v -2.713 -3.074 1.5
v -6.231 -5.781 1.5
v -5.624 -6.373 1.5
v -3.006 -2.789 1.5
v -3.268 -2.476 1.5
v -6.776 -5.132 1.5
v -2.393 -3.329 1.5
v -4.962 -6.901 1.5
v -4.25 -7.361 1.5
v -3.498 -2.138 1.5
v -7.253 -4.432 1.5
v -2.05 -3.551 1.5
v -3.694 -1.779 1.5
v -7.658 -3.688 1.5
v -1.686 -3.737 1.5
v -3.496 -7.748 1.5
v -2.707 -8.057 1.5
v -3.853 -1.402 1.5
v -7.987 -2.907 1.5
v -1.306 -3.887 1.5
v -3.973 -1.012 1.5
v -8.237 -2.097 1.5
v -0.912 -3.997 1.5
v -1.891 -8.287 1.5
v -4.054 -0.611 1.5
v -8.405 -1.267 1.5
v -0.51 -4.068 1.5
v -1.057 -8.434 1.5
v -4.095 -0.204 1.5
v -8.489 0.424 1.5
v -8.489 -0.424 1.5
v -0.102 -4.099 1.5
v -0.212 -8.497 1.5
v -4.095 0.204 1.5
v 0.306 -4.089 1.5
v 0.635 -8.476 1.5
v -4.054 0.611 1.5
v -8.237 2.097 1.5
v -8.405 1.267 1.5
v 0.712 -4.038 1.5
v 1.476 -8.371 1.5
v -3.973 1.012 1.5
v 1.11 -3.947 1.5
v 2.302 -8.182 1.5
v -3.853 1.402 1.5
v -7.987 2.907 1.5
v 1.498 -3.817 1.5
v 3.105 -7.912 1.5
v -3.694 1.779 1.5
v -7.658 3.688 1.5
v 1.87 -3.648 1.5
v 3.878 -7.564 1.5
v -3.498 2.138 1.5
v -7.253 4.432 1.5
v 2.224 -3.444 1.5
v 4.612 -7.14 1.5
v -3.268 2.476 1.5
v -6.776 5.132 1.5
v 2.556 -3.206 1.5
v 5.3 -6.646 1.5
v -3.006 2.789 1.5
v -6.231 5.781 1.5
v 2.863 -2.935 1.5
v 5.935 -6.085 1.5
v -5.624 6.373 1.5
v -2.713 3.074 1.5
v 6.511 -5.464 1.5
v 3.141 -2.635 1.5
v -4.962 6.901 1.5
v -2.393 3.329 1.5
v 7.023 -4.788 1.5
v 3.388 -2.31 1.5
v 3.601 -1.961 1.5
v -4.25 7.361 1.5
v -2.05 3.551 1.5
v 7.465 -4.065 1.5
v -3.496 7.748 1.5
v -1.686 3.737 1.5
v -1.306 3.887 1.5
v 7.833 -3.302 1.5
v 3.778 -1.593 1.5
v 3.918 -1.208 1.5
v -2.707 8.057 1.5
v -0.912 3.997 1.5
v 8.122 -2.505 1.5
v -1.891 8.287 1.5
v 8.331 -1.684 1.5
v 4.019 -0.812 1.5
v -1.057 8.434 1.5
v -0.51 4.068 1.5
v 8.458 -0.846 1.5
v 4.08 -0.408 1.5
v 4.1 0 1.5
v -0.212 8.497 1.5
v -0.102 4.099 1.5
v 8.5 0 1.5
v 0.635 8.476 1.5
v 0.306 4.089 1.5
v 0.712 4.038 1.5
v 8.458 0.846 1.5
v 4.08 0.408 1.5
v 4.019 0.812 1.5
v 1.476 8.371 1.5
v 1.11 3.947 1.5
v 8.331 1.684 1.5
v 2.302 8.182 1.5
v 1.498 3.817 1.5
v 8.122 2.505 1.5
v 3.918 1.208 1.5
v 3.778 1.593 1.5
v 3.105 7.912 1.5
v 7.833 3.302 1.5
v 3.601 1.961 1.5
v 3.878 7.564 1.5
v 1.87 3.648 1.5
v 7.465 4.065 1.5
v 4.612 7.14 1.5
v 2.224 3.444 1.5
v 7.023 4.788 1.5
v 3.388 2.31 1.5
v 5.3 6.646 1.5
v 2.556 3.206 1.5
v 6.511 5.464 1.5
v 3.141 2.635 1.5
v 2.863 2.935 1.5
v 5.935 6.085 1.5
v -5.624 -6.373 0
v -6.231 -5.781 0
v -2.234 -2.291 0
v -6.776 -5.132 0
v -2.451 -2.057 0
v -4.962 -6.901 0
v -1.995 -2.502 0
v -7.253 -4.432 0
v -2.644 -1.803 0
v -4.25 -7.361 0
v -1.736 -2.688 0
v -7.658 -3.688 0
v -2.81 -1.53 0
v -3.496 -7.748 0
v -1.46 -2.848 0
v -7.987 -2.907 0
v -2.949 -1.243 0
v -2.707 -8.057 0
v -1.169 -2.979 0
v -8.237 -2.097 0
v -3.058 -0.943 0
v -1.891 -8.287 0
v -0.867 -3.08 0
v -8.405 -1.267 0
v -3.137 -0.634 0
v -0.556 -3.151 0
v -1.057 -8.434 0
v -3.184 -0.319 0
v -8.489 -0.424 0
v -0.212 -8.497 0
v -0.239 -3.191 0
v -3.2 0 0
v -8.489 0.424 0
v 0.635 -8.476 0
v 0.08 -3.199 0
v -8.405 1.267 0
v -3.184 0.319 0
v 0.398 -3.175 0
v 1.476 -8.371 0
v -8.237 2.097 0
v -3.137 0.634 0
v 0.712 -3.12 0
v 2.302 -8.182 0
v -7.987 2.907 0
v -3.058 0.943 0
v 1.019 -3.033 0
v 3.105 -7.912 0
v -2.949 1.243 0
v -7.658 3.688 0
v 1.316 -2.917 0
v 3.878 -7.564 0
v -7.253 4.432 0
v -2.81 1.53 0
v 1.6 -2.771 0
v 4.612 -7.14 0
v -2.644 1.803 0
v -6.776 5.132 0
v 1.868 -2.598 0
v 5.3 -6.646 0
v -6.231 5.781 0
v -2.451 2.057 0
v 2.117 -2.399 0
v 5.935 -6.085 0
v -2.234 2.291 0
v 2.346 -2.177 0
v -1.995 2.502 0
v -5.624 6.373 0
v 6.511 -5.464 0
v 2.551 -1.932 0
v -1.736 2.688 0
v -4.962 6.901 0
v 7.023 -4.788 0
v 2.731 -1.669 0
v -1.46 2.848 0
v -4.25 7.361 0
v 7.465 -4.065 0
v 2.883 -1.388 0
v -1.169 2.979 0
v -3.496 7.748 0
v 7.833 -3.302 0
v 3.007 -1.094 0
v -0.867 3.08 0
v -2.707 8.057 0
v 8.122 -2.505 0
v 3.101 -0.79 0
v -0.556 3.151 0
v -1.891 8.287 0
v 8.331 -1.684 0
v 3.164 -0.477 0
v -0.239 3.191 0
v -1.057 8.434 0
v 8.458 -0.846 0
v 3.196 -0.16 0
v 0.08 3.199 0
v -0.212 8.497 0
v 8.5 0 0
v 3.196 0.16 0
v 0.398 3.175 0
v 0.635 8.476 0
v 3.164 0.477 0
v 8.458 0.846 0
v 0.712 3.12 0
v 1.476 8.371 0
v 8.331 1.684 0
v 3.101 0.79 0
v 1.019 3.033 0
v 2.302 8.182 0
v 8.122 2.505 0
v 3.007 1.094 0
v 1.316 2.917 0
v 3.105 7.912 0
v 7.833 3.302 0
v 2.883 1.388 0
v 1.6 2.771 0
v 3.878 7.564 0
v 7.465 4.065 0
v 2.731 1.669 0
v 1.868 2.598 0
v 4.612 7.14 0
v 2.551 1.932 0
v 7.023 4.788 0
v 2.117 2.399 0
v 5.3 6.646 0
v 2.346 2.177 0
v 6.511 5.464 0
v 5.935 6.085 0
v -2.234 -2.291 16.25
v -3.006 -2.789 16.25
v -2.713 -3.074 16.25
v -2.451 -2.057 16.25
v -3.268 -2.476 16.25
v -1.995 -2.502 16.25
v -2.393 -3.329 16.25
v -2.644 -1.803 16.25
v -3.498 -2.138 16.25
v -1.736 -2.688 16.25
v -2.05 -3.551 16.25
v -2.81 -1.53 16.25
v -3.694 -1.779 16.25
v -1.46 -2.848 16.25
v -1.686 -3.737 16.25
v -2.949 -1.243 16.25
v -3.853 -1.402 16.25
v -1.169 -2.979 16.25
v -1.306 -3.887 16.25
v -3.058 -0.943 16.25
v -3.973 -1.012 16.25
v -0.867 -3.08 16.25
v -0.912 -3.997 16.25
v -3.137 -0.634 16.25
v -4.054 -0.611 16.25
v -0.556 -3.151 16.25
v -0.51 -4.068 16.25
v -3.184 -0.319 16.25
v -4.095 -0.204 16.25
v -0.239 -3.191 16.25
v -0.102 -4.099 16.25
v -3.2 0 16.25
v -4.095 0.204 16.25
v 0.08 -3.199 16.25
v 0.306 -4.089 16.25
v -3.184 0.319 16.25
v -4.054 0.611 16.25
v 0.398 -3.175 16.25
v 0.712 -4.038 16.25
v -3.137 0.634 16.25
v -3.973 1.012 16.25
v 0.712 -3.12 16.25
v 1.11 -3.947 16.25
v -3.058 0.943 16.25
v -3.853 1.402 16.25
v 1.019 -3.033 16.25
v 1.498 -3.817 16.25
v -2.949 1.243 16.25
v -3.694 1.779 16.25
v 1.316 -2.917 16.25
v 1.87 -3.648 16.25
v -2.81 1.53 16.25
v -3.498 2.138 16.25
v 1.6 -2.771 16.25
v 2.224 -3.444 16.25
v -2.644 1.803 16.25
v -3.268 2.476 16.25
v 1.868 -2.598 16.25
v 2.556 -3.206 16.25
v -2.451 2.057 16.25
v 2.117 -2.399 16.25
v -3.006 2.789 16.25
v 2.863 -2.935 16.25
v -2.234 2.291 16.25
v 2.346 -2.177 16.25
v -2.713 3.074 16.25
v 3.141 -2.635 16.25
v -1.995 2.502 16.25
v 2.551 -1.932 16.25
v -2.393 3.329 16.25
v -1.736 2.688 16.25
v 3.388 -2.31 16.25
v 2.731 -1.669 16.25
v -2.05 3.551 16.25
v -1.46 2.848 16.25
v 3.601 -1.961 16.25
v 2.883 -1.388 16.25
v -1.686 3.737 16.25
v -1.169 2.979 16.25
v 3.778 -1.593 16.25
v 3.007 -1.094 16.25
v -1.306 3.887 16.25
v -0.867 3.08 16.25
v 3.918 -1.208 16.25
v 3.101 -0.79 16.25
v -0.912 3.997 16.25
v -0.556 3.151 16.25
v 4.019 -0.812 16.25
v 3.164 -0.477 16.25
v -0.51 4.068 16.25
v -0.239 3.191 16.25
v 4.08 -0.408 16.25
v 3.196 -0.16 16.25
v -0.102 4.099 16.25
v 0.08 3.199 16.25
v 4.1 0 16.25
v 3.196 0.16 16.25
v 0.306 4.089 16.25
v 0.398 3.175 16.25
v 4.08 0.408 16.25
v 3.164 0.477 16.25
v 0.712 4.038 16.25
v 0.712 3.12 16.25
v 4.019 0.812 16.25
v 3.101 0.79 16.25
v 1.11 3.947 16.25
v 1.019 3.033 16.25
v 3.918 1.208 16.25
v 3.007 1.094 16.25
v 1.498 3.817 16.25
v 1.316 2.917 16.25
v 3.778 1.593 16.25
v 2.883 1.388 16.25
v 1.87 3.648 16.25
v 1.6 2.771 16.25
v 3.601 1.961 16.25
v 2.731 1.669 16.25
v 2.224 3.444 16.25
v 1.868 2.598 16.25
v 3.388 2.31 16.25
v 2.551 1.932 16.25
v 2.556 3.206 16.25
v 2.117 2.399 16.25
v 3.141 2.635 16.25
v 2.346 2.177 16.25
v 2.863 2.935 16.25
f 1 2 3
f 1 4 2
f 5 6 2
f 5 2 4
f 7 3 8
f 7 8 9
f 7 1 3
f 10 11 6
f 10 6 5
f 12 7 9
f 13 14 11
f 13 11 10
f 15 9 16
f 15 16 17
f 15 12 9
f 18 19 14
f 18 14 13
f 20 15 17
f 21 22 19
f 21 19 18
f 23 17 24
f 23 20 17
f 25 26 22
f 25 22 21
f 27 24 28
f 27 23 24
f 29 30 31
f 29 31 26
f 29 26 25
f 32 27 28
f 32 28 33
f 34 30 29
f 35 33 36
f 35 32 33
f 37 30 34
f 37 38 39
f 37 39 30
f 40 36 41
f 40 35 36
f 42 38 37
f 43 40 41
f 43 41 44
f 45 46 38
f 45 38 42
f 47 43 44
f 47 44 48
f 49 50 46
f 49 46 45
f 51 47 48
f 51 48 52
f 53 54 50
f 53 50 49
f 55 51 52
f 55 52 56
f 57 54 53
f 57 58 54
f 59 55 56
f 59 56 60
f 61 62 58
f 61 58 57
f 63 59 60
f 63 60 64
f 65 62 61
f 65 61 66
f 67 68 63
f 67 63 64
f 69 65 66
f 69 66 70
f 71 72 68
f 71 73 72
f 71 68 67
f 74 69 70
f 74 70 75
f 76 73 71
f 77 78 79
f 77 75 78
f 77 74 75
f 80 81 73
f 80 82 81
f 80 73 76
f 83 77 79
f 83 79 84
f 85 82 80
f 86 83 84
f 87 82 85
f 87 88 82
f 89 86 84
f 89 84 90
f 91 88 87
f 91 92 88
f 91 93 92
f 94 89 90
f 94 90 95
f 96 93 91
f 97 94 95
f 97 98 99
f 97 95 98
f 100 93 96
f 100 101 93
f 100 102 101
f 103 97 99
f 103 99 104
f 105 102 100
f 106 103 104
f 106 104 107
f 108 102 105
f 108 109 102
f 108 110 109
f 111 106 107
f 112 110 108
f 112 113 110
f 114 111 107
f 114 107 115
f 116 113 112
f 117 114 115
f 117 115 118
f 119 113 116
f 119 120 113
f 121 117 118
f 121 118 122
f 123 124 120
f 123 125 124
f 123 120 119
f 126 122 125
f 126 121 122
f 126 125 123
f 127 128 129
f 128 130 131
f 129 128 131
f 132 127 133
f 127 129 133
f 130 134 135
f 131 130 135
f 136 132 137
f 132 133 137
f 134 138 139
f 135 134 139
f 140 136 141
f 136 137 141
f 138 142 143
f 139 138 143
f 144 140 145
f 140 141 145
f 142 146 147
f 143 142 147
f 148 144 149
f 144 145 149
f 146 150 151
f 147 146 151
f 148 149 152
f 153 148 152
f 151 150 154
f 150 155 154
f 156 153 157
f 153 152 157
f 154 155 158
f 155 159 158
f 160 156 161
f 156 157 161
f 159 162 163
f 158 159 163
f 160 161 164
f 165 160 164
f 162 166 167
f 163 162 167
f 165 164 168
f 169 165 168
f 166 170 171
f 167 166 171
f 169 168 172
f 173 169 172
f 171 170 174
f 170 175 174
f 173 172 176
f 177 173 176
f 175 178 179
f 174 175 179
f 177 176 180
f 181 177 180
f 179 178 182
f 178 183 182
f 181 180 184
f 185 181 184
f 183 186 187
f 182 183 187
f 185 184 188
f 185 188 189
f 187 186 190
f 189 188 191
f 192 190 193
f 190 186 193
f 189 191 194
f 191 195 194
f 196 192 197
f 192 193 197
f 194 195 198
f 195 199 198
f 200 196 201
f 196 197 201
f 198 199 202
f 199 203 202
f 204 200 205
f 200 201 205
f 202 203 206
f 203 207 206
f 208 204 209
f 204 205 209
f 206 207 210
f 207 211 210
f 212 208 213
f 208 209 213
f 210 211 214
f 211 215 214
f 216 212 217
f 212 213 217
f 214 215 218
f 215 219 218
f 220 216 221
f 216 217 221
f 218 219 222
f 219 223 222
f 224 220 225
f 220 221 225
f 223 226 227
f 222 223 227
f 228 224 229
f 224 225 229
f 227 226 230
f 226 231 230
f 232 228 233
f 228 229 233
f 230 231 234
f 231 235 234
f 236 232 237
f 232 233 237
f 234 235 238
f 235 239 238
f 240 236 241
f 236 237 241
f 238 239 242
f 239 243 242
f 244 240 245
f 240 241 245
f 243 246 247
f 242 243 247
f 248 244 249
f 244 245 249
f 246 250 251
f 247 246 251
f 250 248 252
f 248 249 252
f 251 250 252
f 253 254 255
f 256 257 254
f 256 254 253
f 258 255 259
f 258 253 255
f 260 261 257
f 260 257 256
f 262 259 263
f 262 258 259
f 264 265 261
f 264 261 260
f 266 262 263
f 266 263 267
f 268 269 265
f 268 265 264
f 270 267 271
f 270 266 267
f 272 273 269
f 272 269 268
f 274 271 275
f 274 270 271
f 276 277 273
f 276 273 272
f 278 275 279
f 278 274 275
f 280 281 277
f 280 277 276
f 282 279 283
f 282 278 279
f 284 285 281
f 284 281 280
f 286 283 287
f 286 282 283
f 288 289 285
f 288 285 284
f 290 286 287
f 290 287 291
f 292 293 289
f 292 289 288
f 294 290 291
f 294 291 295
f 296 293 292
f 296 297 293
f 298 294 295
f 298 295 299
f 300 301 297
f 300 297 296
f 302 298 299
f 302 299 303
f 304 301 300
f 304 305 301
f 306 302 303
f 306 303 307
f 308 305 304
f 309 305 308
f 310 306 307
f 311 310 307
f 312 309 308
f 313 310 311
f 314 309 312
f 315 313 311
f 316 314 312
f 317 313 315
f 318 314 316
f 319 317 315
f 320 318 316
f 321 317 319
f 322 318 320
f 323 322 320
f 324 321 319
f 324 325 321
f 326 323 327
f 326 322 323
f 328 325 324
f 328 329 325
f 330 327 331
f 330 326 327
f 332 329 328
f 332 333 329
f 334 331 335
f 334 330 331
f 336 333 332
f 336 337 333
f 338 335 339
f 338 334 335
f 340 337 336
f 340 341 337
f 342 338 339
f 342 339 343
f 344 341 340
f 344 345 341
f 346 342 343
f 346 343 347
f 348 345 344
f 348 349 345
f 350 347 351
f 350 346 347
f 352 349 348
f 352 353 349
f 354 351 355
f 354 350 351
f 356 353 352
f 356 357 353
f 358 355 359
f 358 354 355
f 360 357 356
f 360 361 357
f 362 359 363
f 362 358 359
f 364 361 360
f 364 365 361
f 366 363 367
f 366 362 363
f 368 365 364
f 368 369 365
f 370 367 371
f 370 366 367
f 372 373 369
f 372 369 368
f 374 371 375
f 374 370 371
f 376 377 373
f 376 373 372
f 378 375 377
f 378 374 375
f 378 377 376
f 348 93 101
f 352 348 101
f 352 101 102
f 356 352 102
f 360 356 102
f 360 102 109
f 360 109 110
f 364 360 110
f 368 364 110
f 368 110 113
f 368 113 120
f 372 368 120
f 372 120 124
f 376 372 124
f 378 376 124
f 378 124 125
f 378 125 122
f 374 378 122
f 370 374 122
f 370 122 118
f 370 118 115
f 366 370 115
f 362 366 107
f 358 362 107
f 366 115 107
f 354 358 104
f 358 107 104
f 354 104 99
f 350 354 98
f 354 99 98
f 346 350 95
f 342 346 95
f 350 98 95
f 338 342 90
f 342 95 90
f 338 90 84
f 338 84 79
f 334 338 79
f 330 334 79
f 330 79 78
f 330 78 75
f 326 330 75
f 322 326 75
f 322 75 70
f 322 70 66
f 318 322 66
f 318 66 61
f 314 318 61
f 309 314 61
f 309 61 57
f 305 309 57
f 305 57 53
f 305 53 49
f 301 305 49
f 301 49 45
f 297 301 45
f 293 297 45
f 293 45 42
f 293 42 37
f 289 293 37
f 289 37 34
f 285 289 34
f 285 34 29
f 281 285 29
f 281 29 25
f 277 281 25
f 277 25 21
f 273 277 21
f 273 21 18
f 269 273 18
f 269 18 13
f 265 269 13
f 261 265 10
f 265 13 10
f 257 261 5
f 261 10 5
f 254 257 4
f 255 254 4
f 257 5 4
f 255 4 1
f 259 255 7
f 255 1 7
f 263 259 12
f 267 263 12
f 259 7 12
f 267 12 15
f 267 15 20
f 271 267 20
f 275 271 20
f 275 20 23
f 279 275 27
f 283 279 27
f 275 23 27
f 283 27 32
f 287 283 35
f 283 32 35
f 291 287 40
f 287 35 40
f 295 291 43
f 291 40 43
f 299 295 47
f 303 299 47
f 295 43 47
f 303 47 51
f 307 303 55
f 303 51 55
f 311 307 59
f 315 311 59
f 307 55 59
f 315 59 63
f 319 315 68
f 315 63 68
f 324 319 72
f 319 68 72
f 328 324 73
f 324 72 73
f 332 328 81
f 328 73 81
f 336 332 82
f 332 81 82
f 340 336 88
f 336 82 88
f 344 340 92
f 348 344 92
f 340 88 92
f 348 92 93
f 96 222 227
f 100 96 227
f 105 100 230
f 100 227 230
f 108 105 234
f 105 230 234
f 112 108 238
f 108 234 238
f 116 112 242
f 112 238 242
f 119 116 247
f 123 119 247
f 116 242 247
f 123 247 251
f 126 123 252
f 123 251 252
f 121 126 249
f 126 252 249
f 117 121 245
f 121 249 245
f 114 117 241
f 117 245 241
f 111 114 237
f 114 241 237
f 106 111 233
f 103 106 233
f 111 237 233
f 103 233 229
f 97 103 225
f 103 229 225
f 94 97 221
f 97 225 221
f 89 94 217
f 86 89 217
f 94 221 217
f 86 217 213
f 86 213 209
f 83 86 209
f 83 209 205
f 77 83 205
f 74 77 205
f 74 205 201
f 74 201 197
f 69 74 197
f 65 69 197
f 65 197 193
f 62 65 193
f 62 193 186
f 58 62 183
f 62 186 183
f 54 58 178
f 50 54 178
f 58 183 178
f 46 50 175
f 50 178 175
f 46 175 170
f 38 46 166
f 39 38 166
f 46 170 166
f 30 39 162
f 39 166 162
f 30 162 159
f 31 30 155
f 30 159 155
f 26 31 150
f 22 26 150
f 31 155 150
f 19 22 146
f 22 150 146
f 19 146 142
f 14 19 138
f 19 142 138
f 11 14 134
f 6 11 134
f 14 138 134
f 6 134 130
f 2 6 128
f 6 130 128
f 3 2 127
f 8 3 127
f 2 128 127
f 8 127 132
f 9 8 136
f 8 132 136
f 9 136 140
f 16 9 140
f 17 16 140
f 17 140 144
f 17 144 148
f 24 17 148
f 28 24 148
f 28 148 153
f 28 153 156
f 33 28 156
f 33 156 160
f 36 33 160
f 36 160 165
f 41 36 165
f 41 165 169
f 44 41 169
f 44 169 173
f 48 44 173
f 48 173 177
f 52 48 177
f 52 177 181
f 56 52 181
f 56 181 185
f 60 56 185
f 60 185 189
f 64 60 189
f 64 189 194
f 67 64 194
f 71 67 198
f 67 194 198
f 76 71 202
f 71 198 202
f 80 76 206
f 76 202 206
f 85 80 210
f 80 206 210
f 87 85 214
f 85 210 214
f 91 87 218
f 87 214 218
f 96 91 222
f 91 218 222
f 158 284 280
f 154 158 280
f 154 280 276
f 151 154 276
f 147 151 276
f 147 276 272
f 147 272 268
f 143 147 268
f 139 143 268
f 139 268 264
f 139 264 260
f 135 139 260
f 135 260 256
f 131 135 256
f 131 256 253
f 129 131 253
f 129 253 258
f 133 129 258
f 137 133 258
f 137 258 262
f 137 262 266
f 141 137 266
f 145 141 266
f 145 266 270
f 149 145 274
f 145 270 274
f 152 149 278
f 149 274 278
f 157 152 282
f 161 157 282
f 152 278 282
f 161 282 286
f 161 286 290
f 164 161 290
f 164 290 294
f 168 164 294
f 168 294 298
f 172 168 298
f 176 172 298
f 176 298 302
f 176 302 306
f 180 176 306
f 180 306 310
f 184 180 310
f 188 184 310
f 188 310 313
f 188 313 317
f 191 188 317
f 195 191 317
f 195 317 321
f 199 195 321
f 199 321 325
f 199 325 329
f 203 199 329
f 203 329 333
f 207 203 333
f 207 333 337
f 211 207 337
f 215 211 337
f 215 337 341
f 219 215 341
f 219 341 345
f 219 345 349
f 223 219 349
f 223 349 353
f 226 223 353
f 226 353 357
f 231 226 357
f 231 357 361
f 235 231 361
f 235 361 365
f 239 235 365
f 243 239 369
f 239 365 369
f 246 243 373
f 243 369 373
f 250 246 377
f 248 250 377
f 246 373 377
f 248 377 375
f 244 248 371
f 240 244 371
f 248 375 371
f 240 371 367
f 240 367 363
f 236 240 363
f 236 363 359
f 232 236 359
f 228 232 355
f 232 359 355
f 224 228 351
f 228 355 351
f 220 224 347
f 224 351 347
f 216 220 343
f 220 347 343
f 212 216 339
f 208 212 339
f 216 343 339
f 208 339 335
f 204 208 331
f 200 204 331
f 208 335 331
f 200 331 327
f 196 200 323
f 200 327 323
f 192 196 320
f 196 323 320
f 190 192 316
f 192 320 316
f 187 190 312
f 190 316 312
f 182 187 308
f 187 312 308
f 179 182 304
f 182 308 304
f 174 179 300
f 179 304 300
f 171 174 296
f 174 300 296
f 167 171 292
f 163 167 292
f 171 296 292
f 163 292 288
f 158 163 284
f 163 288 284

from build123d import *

# Parameters (mm, degrees)
F0_R     = 4.1
F1_DEPTH = 16.25
F0_R_2   = 8.5
F2_DEPTH = 1.5
F4_D     = 6.4


with BuildPart() as f1:
    # F0 (on Top) → F1 (new body)
    with BuildSketch(Plane.XY):
        Circle(F0_R)
    extrude(amount=F1_DEPTH)

    # F0 (on Top) → F2 (join)
    with BuildSketch(Plane.XY):
        Circle(F0_R_2)
        Circle(F0_R, mode=Mode.SUBTRACT)
    extrude(amount=F2_DEPTH)

    # F4 (through all)
    with Locations(Plane(origin=(0, 0, 0), x_dir=(1, 0, 0), z_dir=(0, 0, -1))):
        with Locations((0, 0)):
            Hole(F4_D / 2)


solid = f1.part
